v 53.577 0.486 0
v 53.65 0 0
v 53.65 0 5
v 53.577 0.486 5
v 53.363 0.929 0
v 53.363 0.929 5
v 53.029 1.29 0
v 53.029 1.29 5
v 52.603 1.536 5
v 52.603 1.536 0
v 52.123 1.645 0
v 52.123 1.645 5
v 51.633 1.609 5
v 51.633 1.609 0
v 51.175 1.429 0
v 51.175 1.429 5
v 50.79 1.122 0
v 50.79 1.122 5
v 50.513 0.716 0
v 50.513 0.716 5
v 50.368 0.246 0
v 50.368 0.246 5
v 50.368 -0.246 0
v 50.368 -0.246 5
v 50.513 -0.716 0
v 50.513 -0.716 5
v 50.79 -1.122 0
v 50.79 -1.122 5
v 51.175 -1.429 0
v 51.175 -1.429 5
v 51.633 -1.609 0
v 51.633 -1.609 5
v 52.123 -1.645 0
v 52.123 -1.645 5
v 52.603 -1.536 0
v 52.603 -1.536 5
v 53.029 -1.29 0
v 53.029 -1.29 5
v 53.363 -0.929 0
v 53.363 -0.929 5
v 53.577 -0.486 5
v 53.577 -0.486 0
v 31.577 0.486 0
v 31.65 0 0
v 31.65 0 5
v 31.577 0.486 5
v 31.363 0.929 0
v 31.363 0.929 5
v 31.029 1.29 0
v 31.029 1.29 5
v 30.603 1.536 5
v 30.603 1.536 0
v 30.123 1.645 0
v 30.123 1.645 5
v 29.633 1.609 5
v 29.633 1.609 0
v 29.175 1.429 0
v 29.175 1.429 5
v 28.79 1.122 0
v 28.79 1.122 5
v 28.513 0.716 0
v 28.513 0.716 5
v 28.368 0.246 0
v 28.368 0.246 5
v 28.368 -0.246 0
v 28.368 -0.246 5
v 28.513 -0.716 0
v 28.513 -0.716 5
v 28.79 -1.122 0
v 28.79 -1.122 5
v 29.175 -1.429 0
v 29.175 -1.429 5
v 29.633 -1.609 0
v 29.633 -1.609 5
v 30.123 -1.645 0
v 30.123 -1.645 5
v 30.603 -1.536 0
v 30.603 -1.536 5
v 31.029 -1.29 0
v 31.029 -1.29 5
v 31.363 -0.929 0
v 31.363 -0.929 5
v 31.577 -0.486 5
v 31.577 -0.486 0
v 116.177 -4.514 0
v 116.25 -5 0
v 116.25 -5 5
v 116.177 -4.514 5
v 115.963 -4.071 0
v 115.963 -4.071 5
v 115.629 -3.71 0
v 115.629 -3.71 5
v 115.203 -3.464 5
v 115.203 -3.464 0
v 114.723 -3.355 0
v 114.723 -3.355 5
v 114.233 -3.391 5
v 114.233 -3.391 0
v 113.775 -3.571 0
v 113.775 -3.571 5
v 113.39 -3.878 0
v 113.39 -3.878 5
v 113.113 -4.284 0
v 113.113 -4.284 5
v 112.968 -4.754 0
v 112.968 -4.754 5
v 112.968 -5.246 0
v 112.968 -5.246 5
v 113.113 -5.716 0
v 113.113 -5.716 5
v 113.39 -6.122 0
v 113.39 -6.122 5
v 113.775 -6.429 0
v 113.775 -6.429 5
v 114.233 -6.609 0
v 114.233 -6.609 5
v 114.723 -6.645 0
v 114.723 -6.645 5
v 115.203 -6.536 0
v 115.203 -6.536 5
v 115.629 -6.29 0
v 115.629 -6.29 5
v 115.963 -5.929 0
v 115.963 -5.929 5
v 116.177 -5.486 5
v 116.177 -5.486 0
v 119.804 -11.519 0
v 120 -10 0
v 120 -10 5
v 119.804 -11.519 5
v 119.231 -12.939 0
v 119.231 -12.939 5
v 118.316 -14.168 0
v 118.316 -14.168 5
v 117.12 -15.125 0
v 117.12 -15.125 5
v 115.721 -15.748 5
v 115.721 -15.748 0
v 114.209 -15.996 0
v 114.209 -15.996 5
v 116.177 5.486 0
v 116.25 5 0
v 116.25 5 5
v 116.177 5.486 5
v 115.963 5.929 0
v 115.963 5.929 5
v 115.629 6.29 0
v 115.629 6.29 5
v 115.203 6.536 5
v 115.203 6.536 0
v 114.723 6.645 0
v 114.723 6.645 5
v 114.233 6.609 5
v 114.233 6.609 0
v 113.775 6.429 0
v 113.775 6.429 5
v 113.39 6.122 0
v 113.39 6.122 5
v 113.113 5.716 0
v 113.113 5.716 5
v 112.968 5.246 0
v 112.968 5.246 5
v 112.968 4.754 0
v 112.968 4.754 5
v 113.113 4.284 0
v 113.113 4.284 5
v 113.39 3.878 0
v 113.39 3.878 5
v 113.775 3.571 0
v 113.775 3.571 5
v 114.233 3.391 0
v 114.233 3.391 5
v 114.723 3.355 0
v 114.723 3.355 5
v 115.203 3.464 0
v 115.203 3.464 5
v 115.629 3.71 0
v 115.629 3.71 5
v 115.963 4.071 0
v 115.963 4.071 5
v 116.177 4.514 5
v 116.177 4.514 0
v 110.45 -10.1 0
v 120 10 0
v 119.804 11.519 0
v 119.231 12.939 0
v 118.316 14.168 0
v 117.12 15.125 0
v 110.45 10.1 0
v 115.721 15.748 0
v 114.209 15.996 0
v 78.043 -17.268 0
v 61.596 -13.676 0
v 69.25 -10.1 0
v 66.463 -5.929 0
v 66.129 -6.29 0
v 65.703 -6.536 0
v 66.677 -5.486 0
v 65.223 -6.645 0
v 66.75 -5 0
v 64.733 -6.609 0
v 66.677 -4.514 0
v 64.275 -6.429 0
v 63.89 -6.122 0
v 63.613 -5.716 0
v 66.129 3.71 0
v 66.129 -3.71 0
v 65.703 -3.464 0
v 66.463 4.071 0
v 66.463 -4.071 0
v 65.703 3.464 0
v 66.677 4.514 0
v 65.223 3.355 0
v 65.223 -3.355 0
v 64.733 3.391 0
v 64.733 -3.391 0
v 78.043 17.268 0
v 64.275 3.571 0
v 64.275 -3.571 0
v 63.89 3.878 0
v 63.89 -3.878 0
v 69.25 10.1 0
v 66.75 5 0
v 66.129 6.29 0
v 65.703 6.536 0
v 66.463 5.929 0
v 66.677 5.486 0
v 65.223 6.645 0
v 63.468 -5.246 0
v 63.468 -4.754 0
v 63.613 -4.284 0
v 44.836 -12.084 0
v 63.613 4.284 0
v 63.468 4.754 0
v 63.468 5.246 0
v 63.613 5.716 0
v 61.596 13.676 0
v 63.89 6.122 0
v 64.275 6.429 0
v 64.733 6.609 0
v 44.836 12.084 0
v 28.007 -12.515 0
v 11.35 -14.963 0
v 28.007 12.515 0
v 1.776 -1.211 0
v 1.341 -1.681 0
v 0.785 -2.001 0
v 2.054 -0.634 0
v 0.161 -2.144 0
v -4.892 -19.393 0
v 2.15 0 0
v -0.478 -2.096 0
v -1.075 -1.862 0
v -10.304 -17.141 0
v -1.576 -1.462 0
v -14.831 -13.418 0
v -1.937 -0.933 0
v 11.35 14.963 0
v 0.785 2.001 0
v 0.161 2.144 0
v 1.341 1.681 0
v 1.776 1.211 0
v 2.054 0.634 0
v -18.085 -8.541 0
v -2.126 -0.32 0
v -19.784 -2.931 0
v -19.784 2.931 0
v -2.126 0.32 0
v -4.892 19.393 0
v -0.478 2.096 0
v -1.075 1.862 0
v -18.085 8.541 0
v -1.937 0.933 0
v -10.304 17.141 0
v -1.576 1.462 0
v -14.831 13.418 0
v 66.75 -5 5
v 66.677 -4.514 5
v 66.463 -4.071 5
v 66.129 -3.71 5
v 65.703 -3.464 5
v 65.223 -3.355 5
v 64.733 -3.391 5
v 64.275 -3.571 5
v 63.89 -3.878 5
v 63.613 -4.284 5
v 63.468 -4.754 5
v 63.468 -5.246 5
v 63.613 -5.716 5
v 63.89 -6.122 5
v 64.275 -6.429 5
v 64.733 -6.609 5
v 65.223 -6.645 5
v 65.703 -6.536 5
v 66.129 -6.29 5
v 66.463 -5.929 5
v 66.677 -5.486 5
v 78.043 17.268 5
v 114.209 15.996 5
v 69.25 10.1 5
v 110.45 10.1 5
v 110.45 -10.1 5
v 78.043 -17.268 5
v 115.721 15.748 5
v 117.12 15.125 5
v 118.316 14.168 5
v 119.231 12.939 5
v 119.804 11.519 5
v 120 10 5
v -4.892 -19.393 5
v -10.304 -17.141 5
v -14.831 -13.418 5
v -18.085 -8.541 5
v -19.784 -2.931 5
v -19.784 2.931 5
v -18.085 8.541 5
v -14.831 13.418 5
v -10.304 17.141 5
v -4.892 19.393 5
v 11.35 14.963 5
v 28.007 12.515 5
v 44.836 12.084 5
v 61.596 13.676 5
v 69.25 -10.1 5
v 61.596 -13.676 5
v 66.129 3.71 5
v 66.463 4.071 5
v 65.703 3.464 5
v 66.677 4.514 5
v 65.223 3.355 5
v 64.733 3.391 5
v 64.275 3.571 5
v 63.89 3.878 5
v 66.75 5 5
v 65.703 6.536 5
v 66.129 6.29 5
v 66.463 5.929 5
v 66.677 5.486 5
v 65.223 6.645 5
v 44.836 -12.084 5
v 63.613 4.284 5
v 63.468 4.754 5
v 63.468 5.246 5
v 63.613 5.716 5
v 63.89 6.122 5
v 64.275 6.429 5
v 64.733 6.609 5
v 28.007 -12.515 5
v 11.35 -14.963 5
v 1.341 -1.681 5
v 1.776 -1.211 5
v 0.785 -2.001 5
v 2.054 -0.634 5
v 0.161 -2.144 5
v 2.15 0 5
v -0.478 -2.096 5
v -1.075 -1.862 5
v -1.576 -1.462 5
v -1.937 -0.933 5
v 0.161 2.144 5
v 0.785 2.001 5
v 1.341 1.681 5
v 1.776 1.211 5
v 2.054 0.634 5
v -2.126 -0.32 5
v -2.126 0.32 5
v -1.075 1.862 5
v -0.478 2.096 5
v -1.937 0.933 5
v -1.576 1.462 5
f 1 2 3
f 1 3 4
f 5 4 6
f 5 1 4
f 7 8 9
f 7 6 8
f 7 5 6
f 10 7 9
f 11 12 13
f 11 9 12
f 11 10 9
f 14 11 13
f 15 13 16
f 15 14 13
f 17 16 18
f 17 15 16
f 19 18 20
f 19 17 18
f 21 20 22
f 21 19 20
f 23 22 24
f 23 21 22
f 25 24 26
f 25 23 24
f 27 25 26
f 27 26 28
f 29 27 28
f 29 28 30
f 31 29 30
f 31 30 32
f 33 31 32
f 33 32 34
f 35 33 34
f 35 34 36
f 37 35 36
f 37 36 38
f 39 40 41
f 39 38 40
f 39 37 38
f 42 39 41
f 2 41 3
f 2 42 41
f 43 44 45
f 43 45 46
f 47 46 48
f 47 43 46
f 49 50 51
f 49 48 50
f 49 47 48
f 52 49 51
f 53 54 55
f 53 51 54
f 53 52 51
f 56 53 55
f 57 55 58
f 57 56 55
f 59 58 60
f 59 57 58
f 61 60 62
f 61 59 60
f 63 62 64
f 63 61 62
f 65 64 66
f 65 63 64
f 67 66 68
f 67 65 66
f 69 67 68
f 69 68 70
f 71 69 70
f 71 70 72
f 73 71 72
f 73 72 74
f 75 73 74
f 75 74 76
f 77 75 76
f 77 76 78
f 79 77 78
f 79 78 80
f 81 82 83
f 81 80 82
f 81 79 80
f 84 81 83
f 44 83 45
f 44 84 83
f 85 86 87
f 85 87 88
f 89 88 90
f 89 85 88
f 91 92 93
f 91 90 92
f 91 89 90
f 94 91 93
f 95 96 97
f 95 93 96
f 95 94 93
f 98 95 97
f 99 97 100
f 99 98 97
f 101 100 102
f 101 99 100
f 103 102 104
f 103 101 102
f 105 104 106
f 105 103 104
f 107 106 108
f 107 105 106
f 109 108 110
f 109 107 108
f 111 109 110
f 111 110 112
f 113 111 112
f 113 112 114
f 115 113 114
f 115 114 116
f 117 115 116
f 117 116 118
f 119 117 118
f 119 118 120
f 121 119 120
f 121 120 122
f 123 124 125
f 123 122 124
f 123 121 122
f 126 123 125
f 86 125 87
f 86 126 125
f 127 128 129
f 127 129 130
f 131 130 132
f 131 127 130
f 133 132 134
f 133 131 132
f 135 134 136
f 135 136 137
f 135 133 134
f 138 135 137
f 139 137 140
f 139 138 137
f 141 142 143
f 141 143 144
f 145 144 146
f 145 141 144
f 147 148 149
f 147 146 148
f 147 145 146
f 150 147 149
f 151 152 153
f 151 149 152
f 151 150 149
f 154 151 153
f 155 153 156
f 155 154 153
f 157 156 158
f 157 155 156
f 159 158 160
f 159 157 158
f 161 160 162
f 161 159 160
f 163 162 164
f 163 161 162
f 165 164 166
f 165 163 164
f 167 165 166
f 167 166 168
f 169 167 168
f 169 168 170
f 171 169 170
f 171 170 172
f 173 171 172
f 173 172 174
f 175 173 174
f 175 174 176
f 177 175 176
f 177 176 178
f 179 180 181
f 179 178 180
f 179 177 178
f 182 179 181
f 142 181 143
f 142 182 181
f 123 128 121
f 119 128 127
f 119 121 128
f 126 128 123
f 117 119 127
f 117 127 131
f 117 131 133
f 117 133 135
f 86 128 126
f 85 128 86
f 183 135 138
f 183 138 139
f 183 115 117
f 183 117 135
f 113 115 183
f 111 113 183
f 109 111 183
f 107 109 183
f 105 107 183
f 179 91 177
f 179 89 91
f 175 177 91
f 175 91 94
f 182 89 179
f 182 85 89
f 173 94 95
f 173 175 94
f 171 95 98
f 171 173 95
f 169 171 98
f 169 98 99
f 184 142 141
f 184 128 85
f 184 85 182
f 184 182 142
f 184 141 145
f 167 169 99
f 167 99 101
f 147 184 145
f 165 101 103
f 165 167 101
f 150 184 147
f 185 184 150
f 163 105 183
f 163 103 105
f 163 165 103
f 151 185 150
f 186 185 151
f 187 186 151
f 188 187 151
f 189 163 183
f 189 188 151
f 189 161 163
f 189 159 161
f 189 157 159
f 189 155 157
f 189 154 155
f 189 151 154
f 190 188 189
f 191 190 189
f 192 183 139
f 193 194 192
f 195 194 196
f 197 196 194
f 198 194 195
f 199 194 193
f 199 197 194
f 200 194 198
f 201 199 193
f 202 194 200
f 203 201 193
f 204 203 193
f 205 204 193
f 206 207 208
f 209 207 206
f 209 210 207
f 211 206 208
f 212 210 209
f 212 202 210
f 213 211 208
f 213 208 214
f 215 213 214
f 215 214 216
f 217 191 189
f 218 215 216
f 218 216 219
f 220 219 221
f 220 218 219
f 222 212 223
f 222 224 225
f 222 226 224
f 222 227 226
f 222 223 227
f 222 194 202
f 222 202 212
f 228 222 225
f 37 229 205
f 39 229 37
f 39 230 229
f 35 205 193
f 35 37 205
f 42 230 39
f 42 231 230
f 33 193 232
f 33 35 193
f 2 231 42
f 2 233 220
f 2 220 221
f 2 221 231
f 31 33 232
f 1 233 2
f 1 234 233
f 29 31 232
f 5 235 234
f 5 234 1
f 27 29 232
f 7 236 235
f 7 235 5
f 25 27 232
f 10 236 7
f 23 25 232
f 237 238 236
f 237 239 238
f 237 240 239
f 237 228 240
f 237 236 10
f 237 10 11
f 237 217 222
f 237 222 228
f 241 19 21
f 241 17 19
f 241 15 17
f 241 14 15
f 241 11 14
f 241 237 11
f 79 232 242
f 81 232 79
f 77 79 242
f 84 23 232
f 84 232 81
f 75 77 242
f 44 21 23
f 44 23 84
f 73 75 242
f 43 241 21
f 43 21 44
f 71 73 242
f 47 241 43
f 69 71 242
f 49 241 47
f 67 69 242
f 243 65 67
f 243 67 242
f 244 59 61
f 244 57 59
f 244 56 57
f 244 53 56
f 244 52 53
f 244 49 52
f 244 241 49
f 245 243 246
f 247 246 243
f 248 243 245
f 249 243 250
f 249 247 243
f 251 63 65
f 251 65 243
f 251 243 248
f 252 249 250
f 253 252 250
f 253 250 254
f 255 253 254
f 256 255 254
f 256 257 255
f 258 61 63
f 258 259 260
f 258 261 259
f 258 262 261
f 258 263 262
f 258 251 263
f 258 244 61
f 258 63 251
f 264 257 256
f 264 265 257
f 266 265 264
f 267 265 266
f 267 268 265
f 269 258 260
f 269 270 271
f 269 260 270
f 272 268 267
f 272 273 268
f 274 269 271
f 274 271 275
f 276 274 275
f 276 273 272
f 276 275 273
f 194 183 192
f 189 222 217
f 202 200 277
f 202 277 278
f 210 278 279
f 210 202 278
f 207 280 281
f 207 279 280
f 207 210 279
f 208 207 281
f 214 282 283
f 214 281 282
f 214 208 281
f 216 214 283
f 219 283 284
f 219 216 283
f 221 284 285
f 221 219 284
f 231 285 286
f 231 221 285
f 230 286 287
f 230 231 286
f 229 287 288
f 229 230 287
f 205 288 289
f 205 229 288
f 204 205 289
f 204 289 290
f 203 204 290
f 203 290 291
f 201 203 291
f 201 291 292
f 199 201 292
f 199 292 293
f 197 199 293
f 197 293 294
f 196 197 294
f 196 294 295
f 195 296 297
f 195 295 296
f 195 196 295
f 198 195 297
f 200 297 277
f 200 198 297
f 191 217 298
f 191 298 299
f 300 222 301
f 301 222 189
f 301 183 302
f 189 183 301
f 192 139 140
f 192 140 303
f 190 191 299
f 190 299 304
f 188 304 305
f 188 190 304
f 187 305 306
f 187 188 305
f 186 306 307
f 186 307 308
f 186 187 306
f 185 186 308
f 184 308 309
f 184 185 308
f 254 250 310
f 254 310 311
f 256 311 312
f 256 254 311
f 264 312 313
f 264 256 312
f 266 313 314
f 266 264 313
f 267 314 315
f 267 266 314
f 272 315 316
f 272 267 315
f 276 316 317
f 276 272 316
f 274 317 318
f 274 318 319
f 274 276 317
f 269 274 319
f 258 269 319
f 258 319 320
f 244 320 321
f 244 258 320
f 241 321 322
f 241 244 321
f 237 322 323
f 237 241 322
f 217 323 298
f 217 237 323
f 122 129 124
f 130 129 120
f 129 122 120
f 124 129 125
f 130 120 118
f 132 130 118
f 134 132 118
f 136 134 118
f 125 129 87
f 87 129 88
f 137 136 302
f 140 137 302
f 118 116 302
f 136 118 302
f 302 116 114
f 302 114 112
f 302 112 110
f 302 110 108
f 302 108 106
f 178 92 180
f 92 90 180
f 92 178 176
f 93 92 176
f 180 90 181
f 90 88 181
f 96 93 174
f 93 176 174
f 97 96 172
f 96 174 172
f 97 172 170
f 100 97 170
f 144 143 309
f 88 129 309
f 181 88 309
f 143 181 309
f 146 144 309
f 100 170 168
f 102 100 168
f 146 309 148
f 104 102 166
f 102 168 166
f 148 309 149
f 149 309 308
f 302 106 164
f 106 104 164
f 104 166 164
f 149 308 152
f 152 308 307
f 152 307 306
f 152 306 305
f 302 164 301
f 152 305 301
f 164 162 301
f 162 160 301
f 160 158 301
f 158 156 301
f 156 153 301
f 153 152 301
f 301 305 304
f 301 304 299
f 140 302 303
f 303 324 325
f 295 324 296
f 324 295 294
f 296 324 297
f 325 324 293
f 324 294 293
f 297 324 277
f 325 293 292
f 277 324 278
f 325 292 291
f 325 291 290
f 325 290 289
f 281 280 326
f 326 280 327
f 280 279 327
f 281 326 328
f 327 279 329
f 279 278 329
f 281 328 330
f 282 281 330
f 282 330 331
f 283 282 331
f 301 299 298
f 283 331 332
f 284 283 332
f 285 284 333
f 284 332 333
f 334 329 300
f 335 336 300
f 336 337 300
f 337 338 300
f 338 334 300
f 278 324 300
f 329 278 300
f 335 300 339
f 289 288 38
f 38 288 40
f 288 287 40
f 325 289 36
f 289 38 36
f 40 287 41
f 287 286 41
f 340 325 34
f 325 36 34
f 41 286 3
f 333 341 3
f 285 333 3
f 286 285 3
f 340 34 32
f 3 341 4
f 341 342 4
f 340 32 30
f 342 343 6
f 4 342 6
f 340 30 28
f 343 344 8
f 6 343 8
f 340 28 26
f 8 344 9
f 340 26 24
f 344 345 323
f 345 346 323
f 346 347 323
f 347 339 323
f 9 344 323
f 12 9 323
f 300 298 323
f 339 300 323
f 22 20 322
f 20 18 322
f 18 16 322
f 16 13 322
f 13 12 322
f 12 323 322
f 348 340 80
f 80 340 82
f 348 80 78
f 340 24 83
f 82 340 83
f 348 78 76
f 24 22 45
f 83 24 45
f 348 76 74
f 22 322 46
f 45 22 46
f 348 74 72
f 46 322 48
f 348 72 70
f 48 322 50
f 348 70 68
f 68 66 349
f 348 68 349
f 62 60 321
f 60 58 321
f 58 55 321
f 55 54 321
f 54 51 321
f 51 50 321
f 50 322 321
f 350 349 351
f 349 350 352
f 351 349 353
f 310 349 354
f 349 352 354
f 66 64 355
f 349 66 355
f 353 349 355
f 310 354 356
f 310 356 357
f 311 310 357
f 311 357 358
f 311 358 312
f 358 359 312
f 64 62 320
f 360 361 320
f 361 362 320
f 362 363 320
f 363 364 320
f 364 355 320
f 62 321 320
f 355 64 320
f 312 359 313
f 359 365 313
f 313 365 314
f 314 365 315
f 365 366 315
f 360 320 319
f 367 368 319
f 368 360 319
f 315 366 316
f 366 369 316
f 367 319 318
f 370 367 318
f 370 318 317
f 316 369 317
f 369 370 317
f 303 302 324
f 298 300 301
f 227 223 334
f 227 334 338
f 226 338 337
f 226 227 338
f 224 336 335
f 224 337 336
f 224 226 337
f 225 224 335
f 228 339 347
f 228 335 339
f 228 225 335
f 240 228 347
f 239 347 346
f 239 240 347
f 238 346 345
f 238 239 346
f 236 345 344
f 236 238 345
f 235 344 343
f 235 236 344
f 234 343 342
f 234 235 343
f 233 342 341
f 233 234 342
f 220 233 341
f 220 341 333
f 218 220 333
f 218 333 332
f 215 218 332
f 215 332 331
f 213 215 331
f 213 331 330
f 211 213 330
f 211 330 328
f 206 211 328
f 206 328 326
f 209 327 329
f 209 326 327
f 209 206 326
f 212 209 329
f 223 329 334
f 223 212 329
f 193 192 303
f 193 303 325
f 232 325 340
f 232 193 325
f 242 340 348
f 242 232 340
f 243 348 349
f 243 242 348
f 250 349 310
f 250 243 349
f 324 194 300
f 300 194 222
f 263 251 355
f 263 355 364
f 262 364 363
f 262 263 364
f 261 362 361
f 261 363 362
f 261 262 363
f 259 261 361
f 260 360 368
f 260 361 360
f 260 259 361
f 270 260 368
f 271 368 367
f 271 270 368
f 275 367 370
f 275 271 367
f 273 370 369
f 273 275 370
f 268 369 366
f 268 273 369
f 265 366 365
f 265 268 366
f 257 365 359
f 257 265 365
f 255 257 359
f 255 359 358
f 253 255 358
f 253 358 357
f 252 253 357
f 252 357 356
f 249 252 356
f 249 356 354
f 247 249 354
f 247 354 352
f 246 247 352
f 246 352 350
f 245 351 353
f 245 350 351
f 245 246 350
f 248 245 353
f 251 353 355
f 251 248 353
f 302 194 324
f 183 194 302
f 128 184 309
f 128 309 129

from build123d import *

# Parameters (mm, degrees)
ESKIZ_KONTUR_W        = 41.2
ESKIZ_KONTUR_H        = 20.2
PLASTINA_DEPTH        = 5
OTVERSTIYA_DEPTH      = 122.659652126
OTVERSTIYA_DEPTH_BACK = 122.659652126
ESKIZ_OTVERSTIYA_R    = 1.65
ESKIZ_OTVERSTIYA_R_2  = 2.15


with BuildPart() as part:
    # Eskiz_kontur → Plastina (new body)
    with BuildSketch(Plane.XY):
        with BuildLine():
            Line((78.04349, 17.26807), (114.2094, 15.99634))
            ThreePointArc((114.2094, 15.99634), (118.316039529, 14.167943464), (119.999997488, 9.999993404))
            Line((119.999997488, 9.999993404), (119.999997488, -10.000006596))
            ThreePointArc((119.999997488, -10.000006596), (118.31603808, -14.167953985), (114.2094, -15.996349022))
            Line((114.2094, -15.996349022), (78.04349, -17.268079022))
            ThreePointArc((78.04349, -17.268079022), (36.414907375, -12.045919499), (-4.891710116, -19.392564511))
            ThreePointArc((-4.891710116, -19.392564511), (-20.000005367, -4.511e-06), (-4.891710116, 19.392555489))
            ThreePointArc((-4.891710116, 19.392555489), (36.414907375, 12.045910477), (78.04349, 17.26807))
        make_face()
        with Locations((89.85, 0)):
            Rectangle(ESKIZ_KONTUR_W, ESKIZ_KONTUR_H, mode=Mode.SUBTRACT)
    extrude(amount=PLASTINA_DEPTH)

    # Eskiz_otverstiya → Otverstiya (cut, two sides: drawn at the far end of the back side and taken through both)
    with BuildSketch(Plane.XY.offset(-OTVERSTIYA_DEPTH_BACK)):
        with Locations((65.1, -5)):
            Circle(ESKIZ_OTVERSTIYA_R)
        with Locations((114.6, -5)):
            Circle(ESKIZ_OTVERSTIYA_R)
        Circle(ESKIZ_OTVERSTIYA_R_2)
        with Locations((30, 0)):
            Circle(ESKIZ_OTVERSTIYA_R)
        with Locations((52, 0)):
            Circle(ESKIZ_OTVERSTIYA_R)
        with Locations((65.1, 5)):
            Circle(ESKIZ_OTVERSTIYA_R)
        with Locations((114.6, 5)):
            Circle(ESKIZ_OTVERSTIYA_R)
    extrude(amount=OTVERSTIYA_DEPTH + OTVERSTIYA_DEPTH_BACK, mode=Mode.SUBTRACT)


solid = part.part
